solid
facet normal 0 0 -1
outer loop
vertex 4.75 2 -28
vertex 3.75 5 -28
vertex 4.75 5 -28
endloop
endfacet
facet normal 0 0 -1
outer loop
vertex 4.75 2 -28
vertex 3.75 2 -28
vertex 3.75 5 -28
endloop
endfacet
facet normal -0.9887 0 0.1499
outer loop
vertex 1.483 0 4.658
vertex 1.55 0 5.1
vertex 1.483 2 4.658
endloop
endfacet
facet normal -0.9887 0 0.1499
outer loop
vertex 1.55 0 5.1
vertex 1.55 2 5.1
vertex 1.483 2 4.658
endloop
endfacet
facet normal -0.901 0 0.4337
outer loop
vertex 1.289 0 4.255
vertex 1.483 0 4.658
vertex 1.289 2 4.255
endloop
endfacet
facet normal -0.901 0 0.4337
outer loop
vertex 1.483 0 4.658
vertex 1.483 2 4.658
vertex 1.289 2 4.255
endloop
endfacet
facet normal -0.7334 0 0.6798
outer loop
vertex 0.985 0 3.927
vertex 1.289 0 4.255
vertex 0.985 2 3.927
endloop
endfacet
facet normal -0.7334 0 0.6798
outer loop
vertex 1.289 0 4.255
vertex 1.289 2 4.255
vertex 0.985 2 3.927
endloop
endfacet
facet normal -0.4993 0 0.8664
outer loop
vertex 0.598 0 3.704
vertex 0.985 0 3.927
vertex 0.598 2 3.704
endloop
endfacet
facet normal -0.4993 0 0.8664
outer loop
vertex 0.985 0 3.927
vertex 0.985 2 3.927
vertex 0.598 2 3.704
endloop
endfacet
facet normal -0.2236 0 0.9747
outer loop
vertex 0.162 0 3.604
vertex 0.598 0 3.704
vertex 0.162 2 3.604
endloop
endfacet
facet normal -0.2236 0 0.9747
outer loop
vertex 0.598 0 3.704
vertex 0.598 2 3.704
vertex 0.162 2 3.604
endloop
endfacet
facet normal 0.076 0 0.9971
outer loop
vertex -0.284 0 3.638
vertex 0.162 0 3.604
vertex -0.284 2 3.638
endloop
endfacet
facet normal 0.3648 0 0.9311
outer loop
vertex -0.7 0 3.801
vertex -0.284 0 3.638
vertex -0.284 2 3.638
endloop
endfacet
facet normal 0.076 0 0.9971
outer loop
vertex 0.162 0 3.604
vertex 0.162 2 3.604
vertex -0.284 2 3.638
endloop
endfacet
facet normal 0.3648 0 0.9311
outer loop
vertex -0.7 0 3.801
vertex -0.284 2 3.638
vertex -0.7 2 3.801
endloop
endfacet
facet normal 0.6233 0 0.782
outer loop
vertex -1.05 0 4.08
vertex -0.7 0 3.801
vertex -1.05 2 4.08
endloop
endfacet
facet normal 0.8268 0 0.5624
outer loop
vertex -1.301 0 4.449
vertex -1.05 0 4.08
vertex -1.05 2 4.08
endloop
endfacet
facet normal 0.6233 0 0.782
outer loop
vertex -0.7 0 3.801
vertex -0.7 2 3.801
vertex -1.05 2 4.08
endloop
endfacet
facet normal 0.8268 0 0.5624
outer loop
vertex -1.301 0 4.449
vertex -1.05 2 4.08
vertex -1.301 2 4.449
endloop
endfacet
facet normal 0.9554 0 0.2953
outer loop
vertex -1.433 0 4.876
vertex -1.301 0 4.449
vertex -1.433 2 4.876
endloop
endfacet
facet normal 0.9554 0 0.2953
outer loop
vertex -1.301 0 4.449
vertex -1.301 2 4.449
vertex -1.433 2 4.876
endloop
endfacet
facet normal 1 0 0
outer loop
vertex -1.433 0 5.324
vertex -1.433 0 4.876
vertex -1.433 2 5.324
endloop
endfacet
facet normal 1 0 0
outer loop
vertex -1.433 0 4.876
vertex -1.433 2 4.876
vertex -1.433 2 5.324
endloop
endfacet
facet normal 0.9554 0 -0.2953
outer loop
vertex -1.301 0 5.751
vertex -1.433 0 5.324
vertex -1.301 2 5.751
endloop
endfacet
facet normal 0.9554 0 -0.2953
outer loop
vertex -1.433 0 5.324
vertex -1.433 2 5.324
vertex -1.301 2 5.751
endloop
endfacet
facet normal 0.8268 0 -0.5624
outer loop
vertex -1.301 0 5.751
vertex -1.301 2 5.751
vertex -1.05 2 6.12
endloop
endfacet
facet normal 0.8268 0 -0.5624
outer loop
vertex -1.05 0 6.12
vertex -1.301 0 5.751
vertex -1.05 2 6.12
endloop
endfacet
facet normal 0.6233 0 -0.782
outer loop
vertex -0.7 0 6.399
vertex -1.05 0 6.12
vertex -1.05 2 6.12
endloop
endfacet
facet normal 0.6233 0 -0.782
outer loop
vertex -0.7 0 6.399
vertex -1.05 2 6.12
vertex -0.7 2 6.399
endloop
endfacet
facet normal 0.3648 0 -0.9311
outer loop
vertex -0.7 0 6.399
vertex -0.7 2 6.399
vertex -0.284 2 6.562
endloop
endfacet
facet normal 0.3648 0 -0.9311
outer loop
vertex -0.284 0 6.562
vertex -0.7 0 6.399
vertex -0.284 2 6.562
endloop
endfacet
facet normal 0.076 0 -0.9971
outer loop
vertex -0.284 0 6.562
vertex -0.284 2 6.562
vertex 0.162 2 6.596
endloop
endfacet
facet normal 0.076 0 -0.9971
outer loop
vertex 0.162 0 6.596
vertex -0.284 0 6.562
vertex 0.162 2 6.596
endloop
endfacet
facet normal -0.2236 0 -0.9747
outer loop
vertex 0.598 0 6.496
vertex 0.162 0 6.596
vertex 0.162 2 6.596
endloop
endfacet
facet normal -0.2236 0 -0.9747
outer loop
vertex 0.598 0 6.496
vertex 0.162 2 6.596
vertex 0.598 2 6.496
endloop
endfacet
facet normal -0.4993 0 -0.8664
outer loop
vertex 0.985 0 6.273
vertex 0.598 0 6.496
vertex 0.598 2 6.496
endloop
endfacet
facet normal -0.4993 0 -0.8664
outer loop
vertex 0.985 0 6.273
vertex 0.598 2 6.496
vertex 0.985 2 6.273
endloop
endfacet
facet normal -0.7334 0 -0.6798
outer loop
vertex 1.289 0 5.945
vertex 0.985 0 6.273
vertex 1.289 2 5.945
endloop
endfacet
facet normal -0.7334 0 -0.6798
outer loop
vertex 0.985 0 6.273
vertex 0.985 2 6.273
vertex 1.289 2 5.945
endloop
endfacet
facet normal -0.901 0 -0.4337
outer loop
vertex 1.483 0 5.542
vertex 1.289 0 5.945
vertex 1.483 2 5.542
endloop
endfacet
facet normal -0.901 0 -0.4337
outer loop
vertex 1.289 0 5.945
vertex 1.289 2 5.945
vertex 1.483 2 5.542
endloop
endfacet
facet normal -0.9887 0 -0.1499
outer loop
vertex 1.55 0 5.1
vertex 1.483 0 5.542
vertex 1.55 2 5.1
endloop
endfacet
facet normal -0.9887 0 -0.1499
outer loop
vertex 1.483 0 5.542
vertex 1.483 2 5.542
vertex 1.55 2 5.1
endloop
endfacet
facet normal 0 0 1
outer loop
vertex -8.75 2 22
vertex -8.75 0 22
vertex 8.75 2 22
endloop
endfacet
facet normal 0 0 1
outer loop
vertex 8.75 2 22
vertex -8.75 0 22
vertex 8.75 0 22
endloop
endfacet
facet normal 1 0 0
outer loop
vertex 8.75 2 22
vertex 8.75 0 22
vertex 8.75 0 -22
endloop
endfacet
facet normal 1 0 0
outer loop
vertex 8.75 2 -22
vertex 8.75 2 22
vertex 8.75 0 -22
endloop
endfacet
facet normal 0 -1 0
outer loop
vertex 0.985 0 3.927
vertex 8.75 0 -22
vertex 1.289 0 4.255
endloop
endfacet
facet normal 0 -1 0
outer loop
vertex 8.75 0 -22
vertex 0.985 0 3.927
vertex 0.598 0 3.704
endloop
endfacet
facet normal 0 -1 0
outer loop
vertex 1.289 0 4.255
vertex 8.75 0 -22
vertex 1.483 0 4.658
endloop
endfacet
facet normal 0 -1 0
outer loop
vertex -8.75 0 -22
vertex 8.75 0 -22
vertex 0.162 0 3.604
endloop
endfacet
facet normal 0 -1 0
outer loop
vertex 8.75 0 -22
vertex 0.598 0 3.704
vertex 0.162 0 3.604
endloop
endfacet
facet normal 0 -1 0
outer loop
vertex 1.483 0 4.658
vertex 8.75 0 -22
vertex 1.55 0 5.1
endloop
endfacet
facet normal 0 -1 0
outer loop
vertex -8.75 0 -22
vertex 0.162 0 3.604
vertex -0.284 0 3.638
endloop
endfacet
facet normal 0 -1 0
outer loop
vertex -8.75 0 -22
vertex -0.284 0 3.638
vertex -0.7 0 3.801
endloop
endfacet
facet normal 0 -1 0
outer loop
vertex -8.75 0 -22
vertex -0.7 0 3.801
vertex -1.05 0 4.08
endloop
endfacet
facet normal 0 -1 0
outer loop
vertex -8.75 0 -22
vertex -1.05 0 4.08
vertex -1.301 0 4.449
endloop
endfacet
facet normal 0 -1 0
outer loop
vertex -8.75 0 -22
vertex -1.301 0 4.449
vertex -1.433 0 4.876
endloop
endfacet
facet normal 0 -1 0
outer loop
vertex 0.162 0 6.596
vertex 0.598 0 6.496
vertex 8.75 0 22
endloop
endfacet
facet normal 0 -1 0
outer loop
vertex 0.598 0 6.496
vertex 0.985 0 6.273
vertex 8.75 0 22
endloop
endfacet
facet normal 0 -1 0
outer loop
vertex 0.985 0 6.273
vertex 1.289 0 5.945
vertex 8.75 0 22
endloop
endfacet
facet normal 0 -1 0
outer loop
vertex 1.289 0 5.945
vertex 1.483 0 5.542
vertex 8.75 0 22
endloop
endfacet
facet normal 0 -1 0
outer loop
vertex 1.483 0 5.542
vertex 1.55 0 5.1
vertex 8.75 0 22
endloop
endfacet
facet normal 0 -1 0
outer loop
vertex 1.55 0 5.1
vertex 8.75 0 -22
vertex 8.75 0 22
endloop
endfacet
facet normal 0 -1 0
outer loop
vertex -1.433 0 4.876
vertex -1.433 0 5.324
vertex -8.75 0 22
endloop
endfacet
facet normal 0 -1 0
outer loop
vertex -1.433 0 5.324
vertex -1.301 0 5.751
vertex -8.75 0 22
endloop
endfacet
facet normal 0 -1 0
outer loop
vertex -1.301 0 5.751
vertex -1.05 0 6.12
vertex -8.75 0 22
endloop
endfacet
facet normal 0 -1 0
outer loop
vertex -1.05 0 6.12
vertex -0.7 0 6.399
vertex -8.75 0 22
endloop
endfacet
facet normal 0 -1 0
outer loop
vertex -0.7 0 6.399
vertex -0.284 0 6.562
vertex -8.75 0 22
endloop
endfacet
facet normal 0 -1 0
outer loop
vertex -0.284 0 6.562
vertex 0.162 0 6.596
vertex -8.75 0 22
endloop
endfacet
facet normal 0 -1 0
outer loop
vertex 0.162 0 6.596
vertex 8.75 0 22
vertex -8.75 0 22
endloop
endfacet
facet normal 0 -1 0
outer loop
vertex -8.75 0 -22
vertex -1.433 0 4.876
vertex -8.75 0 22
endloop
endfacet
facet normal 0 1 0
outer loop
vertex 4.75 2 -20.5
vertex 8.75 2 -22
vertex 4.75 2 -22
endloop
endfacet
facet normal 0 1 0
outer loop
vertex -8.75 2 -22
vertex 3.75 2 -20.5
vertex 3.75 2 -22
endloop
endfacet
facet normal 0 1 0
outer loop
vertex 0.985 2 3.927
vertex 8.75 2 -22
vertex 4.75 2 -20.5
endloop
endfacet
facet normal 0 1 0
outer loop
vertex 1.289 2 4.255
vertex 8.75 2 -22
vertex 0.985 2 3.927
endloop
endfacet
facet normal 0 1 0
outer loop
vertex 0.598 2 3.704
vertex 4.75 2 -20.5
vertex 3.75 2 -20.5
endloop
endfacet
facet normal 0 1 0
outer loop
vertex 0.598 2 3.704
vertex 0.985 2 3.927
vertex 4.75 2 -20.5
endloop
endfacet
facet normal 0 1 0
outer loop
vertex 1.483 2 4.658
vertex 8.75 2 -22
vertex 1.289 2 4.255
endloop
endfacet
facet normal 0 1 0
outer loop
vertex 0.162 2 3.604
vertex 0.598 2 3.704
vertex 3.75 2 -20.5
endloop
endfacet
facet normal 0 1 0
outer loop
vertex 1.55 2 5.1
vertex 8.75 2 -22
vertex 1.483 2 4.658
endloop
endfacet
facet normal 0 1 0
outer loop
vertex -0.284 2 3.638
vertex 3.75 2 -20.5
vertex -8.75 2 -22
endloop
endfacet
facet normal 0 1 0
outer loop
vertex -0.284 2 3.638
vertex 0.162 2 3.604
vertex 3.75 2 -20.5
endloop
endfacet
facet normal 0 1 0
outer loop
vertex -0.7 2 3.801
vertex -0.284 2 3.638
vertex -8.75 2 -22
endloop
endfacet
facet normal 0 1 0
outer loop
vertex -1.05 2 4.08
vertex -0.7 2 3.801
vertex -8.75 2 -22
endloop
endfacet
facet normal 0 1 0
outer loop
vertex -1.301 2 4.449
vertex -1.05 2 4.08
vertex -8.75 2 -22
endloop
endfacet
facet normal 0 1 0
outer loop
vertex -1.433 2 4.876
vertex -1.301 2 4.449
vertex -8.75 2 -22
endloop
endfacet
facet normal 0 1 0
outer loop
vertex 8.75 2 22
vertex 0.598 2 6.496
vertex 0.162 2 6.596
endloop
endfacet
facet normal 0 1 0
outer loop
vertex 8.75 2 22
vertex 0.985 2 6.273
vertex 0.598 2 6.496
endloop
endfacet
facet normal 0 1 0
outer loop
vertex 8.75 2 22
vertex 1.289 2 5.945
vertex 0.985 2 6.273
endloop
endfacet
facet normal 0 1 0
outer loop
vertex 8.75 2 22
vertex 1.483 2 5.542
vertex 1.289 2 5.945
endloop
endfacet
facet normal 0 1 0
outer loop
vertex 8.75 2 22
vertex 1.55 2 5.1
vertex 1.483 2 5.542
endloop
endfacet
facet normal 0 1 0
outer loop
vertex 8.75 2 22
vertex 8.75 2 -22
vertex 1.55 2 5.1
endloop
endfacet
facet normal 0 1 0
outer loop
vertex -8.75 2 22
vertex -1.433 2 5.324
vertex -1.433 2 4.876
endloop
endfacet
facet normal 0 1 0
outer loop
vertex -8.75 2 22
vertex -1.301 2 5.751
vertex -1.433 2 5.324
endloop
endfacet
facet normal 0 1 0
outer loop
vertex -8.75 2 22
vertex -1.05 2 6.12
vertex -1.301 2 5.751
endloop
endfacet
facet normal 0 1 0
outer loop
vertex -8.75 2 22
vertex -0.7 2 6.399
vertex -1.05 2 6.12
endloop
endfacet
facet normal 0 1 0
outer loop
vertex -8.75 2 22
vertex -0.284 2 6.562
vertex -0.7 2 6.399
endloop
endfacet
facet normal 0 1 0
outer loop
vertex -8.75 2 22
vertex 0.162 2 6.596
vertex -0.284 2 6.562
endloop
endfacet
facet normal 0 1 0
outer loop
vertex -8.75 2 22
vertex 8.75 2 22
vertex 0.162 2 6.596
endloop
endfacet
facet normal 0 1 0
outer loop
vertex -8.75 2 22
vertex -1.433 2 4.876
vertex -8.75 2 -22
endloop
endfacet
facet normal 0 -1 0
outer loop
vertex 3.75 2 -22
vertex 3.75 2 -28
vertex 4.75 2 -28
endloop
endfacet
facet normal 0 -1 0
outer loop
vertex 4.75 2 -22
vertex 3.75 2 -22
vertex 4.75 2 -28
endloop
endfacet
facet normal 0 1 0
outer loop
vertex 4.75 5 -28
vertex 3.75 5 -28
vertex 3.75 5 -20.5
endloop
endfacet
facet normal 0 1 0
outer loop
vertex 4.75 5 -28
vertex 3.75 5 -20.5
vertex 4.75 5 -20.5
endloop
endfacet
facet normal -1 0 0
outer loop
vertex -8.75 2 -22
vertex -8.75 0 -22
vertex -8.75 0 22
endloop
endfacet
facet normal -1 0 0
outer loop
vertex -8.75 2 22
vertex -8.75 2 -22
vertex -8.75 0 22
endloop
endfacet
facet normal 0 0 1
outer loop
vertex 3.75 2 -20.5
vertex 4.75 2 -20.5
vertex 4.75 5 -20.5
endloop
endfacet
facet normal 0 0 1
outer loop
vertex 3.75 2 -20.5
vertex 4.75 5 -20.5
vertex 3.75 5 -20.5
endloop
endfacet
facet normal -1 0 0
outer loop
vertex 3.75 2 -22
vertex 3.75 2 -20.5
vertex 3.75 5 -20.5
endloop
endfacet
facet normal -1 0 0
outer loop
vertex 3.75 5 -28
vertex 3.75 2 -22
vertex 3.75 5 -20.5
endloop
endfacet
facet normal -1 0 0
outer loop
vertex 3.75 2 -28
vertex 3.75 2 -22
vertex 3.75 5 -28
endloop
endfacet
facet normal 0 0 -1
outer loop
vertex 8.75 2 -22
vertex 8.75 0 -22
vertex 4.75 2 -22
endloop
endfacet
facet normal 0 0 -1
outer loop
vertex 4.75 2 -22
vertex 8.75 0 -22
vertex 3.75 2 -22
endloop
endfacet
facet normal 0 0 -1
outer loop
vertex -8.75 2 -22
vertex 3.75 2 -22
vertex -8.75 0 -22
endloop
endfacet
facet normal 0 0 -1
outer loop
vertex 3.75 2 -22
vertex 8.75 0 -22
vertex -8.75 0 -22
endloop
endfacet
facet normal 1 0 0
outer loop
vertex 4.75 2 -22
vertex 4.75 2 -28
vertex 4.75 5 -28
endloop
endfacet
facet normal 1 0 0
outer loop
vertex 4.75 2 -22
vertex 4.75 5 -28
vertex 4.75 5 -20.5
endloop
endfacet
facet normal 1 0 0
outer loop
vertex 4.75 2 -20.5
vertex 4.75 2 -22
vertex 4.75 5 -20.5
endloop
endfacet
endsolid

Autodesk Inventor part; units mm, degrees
ref_plane "YZ Plane" through (0, 0, 0) normal (1, 0, 0) x (0, 1, 0)
ref_plane "XZ Plane" through (0, 0, 0) normal (0, 1, 0) x (-1, 0, 0)
ref_plane "XY Plane" through (0, 0, 0) normal (0, 0, 1) x (1, 0, 0)
sketch "Sketch1" plane through (0, 0, 0) normal (0, 1, 0) x (-1, 0, 0)
  line L0 (-8.75, 22) -> (-8.75, -22)
  line L1 (-8.75, -22) -> (8.75, -22)
  line L2 (8.75, -22) -> (8.75, 22)
  line L3 (8.75, 22) -> (-8.75, 22)
  line L4 (-8.75, 22) -> (8.75, -22) construction
  line L5 (-8.75, -22) -> (8.75, 22) construction
  line L6 (-8.75, 22) -> (-1.75, 22)
  point P0 (0, 0)
  dimension "d1" = 44
  dimension "d2" = 17.5
extrude "Extrusion1" add sketch "Sketch1" along normal blind 2
sketch "Sketch2" plane through (0, 2, 0) normal (0, 1, 0) x (1, 0, 0)
  line L0 (8.75, 22) -> (-8.75, 22) projected
  line L1 (-8.6195, 22) -> (8.6907, 22) construction
  line L2 (8.6907, 22) -> (8.6907, -23.9682) construction
  line L3 (8.6907, -23.9682) -> (-8.6195, -23.9682) construction
  line L4 (-8.6195, -23.9682) -> (-8.6195, 22) construction
  circle A0 centre (0.05, -5.1) radius 1.5
  line L5 (8.75, -22) -> (8.75, 22) projected
  line L6 (-8.75, -22) -> (8.75, -22) projected
  point P0 (0, 0)
  dimension "d39" = 3
  dimension "d42" = 8.7
  dimension "d43" = 16.9
decal "Decal1"
sketch "Sketch3" plane through (0, 2, 0) normal (0, 1, 0) x (1, 0, 0)
  circle A0 centre (0.05, -5.1) radius 1.5
  line L0 (8.75, -22) -> (8.75, -101.371)
  line L1 (-21.6488, -22) -> (8.75, -22)
  line L2 (8.75, -22) -> (8.75, 22) projected
  line L3 (-8.75, -22) -> (8.75, -22) projected
  point P0 (0, 0)
  point P1 (-12.8988, -61.6855)
  dimension "d44" = 3
  dimension "d45" = 8.7
  dimension "d46" = 16.9
extrude "Extrusion2" cut sketch "Sketch3" against normal through all
sketch "Sketch4" plane through (0, 2, 0) normal (0, 1, 0) x (1, 0, 0)
  line L0 (4.75, 20.5) -> (3.75, 20.5)
  line L1 (3.75, 20.5) -> (3.75, 28)
  line L2 (3.75, 28) -> (4.75, 28)
  line L3 (4.75, 28) -> (4.75, 20.5)
  line L4 (8.75, -22) -> (8.75, 22) projected
  line L5 (8.75, 22) -> (-8.75, 22) projected
  point P0 (0, 0)
  dimension "d51" = 4
  dimension "d52" = 1
  dimension "d53" = 1.5
  dimension "d54" = 7.5
extrude "Extrusion3" add sketch "Sketch4" along normal blind 3
properties part number "3DModel"
